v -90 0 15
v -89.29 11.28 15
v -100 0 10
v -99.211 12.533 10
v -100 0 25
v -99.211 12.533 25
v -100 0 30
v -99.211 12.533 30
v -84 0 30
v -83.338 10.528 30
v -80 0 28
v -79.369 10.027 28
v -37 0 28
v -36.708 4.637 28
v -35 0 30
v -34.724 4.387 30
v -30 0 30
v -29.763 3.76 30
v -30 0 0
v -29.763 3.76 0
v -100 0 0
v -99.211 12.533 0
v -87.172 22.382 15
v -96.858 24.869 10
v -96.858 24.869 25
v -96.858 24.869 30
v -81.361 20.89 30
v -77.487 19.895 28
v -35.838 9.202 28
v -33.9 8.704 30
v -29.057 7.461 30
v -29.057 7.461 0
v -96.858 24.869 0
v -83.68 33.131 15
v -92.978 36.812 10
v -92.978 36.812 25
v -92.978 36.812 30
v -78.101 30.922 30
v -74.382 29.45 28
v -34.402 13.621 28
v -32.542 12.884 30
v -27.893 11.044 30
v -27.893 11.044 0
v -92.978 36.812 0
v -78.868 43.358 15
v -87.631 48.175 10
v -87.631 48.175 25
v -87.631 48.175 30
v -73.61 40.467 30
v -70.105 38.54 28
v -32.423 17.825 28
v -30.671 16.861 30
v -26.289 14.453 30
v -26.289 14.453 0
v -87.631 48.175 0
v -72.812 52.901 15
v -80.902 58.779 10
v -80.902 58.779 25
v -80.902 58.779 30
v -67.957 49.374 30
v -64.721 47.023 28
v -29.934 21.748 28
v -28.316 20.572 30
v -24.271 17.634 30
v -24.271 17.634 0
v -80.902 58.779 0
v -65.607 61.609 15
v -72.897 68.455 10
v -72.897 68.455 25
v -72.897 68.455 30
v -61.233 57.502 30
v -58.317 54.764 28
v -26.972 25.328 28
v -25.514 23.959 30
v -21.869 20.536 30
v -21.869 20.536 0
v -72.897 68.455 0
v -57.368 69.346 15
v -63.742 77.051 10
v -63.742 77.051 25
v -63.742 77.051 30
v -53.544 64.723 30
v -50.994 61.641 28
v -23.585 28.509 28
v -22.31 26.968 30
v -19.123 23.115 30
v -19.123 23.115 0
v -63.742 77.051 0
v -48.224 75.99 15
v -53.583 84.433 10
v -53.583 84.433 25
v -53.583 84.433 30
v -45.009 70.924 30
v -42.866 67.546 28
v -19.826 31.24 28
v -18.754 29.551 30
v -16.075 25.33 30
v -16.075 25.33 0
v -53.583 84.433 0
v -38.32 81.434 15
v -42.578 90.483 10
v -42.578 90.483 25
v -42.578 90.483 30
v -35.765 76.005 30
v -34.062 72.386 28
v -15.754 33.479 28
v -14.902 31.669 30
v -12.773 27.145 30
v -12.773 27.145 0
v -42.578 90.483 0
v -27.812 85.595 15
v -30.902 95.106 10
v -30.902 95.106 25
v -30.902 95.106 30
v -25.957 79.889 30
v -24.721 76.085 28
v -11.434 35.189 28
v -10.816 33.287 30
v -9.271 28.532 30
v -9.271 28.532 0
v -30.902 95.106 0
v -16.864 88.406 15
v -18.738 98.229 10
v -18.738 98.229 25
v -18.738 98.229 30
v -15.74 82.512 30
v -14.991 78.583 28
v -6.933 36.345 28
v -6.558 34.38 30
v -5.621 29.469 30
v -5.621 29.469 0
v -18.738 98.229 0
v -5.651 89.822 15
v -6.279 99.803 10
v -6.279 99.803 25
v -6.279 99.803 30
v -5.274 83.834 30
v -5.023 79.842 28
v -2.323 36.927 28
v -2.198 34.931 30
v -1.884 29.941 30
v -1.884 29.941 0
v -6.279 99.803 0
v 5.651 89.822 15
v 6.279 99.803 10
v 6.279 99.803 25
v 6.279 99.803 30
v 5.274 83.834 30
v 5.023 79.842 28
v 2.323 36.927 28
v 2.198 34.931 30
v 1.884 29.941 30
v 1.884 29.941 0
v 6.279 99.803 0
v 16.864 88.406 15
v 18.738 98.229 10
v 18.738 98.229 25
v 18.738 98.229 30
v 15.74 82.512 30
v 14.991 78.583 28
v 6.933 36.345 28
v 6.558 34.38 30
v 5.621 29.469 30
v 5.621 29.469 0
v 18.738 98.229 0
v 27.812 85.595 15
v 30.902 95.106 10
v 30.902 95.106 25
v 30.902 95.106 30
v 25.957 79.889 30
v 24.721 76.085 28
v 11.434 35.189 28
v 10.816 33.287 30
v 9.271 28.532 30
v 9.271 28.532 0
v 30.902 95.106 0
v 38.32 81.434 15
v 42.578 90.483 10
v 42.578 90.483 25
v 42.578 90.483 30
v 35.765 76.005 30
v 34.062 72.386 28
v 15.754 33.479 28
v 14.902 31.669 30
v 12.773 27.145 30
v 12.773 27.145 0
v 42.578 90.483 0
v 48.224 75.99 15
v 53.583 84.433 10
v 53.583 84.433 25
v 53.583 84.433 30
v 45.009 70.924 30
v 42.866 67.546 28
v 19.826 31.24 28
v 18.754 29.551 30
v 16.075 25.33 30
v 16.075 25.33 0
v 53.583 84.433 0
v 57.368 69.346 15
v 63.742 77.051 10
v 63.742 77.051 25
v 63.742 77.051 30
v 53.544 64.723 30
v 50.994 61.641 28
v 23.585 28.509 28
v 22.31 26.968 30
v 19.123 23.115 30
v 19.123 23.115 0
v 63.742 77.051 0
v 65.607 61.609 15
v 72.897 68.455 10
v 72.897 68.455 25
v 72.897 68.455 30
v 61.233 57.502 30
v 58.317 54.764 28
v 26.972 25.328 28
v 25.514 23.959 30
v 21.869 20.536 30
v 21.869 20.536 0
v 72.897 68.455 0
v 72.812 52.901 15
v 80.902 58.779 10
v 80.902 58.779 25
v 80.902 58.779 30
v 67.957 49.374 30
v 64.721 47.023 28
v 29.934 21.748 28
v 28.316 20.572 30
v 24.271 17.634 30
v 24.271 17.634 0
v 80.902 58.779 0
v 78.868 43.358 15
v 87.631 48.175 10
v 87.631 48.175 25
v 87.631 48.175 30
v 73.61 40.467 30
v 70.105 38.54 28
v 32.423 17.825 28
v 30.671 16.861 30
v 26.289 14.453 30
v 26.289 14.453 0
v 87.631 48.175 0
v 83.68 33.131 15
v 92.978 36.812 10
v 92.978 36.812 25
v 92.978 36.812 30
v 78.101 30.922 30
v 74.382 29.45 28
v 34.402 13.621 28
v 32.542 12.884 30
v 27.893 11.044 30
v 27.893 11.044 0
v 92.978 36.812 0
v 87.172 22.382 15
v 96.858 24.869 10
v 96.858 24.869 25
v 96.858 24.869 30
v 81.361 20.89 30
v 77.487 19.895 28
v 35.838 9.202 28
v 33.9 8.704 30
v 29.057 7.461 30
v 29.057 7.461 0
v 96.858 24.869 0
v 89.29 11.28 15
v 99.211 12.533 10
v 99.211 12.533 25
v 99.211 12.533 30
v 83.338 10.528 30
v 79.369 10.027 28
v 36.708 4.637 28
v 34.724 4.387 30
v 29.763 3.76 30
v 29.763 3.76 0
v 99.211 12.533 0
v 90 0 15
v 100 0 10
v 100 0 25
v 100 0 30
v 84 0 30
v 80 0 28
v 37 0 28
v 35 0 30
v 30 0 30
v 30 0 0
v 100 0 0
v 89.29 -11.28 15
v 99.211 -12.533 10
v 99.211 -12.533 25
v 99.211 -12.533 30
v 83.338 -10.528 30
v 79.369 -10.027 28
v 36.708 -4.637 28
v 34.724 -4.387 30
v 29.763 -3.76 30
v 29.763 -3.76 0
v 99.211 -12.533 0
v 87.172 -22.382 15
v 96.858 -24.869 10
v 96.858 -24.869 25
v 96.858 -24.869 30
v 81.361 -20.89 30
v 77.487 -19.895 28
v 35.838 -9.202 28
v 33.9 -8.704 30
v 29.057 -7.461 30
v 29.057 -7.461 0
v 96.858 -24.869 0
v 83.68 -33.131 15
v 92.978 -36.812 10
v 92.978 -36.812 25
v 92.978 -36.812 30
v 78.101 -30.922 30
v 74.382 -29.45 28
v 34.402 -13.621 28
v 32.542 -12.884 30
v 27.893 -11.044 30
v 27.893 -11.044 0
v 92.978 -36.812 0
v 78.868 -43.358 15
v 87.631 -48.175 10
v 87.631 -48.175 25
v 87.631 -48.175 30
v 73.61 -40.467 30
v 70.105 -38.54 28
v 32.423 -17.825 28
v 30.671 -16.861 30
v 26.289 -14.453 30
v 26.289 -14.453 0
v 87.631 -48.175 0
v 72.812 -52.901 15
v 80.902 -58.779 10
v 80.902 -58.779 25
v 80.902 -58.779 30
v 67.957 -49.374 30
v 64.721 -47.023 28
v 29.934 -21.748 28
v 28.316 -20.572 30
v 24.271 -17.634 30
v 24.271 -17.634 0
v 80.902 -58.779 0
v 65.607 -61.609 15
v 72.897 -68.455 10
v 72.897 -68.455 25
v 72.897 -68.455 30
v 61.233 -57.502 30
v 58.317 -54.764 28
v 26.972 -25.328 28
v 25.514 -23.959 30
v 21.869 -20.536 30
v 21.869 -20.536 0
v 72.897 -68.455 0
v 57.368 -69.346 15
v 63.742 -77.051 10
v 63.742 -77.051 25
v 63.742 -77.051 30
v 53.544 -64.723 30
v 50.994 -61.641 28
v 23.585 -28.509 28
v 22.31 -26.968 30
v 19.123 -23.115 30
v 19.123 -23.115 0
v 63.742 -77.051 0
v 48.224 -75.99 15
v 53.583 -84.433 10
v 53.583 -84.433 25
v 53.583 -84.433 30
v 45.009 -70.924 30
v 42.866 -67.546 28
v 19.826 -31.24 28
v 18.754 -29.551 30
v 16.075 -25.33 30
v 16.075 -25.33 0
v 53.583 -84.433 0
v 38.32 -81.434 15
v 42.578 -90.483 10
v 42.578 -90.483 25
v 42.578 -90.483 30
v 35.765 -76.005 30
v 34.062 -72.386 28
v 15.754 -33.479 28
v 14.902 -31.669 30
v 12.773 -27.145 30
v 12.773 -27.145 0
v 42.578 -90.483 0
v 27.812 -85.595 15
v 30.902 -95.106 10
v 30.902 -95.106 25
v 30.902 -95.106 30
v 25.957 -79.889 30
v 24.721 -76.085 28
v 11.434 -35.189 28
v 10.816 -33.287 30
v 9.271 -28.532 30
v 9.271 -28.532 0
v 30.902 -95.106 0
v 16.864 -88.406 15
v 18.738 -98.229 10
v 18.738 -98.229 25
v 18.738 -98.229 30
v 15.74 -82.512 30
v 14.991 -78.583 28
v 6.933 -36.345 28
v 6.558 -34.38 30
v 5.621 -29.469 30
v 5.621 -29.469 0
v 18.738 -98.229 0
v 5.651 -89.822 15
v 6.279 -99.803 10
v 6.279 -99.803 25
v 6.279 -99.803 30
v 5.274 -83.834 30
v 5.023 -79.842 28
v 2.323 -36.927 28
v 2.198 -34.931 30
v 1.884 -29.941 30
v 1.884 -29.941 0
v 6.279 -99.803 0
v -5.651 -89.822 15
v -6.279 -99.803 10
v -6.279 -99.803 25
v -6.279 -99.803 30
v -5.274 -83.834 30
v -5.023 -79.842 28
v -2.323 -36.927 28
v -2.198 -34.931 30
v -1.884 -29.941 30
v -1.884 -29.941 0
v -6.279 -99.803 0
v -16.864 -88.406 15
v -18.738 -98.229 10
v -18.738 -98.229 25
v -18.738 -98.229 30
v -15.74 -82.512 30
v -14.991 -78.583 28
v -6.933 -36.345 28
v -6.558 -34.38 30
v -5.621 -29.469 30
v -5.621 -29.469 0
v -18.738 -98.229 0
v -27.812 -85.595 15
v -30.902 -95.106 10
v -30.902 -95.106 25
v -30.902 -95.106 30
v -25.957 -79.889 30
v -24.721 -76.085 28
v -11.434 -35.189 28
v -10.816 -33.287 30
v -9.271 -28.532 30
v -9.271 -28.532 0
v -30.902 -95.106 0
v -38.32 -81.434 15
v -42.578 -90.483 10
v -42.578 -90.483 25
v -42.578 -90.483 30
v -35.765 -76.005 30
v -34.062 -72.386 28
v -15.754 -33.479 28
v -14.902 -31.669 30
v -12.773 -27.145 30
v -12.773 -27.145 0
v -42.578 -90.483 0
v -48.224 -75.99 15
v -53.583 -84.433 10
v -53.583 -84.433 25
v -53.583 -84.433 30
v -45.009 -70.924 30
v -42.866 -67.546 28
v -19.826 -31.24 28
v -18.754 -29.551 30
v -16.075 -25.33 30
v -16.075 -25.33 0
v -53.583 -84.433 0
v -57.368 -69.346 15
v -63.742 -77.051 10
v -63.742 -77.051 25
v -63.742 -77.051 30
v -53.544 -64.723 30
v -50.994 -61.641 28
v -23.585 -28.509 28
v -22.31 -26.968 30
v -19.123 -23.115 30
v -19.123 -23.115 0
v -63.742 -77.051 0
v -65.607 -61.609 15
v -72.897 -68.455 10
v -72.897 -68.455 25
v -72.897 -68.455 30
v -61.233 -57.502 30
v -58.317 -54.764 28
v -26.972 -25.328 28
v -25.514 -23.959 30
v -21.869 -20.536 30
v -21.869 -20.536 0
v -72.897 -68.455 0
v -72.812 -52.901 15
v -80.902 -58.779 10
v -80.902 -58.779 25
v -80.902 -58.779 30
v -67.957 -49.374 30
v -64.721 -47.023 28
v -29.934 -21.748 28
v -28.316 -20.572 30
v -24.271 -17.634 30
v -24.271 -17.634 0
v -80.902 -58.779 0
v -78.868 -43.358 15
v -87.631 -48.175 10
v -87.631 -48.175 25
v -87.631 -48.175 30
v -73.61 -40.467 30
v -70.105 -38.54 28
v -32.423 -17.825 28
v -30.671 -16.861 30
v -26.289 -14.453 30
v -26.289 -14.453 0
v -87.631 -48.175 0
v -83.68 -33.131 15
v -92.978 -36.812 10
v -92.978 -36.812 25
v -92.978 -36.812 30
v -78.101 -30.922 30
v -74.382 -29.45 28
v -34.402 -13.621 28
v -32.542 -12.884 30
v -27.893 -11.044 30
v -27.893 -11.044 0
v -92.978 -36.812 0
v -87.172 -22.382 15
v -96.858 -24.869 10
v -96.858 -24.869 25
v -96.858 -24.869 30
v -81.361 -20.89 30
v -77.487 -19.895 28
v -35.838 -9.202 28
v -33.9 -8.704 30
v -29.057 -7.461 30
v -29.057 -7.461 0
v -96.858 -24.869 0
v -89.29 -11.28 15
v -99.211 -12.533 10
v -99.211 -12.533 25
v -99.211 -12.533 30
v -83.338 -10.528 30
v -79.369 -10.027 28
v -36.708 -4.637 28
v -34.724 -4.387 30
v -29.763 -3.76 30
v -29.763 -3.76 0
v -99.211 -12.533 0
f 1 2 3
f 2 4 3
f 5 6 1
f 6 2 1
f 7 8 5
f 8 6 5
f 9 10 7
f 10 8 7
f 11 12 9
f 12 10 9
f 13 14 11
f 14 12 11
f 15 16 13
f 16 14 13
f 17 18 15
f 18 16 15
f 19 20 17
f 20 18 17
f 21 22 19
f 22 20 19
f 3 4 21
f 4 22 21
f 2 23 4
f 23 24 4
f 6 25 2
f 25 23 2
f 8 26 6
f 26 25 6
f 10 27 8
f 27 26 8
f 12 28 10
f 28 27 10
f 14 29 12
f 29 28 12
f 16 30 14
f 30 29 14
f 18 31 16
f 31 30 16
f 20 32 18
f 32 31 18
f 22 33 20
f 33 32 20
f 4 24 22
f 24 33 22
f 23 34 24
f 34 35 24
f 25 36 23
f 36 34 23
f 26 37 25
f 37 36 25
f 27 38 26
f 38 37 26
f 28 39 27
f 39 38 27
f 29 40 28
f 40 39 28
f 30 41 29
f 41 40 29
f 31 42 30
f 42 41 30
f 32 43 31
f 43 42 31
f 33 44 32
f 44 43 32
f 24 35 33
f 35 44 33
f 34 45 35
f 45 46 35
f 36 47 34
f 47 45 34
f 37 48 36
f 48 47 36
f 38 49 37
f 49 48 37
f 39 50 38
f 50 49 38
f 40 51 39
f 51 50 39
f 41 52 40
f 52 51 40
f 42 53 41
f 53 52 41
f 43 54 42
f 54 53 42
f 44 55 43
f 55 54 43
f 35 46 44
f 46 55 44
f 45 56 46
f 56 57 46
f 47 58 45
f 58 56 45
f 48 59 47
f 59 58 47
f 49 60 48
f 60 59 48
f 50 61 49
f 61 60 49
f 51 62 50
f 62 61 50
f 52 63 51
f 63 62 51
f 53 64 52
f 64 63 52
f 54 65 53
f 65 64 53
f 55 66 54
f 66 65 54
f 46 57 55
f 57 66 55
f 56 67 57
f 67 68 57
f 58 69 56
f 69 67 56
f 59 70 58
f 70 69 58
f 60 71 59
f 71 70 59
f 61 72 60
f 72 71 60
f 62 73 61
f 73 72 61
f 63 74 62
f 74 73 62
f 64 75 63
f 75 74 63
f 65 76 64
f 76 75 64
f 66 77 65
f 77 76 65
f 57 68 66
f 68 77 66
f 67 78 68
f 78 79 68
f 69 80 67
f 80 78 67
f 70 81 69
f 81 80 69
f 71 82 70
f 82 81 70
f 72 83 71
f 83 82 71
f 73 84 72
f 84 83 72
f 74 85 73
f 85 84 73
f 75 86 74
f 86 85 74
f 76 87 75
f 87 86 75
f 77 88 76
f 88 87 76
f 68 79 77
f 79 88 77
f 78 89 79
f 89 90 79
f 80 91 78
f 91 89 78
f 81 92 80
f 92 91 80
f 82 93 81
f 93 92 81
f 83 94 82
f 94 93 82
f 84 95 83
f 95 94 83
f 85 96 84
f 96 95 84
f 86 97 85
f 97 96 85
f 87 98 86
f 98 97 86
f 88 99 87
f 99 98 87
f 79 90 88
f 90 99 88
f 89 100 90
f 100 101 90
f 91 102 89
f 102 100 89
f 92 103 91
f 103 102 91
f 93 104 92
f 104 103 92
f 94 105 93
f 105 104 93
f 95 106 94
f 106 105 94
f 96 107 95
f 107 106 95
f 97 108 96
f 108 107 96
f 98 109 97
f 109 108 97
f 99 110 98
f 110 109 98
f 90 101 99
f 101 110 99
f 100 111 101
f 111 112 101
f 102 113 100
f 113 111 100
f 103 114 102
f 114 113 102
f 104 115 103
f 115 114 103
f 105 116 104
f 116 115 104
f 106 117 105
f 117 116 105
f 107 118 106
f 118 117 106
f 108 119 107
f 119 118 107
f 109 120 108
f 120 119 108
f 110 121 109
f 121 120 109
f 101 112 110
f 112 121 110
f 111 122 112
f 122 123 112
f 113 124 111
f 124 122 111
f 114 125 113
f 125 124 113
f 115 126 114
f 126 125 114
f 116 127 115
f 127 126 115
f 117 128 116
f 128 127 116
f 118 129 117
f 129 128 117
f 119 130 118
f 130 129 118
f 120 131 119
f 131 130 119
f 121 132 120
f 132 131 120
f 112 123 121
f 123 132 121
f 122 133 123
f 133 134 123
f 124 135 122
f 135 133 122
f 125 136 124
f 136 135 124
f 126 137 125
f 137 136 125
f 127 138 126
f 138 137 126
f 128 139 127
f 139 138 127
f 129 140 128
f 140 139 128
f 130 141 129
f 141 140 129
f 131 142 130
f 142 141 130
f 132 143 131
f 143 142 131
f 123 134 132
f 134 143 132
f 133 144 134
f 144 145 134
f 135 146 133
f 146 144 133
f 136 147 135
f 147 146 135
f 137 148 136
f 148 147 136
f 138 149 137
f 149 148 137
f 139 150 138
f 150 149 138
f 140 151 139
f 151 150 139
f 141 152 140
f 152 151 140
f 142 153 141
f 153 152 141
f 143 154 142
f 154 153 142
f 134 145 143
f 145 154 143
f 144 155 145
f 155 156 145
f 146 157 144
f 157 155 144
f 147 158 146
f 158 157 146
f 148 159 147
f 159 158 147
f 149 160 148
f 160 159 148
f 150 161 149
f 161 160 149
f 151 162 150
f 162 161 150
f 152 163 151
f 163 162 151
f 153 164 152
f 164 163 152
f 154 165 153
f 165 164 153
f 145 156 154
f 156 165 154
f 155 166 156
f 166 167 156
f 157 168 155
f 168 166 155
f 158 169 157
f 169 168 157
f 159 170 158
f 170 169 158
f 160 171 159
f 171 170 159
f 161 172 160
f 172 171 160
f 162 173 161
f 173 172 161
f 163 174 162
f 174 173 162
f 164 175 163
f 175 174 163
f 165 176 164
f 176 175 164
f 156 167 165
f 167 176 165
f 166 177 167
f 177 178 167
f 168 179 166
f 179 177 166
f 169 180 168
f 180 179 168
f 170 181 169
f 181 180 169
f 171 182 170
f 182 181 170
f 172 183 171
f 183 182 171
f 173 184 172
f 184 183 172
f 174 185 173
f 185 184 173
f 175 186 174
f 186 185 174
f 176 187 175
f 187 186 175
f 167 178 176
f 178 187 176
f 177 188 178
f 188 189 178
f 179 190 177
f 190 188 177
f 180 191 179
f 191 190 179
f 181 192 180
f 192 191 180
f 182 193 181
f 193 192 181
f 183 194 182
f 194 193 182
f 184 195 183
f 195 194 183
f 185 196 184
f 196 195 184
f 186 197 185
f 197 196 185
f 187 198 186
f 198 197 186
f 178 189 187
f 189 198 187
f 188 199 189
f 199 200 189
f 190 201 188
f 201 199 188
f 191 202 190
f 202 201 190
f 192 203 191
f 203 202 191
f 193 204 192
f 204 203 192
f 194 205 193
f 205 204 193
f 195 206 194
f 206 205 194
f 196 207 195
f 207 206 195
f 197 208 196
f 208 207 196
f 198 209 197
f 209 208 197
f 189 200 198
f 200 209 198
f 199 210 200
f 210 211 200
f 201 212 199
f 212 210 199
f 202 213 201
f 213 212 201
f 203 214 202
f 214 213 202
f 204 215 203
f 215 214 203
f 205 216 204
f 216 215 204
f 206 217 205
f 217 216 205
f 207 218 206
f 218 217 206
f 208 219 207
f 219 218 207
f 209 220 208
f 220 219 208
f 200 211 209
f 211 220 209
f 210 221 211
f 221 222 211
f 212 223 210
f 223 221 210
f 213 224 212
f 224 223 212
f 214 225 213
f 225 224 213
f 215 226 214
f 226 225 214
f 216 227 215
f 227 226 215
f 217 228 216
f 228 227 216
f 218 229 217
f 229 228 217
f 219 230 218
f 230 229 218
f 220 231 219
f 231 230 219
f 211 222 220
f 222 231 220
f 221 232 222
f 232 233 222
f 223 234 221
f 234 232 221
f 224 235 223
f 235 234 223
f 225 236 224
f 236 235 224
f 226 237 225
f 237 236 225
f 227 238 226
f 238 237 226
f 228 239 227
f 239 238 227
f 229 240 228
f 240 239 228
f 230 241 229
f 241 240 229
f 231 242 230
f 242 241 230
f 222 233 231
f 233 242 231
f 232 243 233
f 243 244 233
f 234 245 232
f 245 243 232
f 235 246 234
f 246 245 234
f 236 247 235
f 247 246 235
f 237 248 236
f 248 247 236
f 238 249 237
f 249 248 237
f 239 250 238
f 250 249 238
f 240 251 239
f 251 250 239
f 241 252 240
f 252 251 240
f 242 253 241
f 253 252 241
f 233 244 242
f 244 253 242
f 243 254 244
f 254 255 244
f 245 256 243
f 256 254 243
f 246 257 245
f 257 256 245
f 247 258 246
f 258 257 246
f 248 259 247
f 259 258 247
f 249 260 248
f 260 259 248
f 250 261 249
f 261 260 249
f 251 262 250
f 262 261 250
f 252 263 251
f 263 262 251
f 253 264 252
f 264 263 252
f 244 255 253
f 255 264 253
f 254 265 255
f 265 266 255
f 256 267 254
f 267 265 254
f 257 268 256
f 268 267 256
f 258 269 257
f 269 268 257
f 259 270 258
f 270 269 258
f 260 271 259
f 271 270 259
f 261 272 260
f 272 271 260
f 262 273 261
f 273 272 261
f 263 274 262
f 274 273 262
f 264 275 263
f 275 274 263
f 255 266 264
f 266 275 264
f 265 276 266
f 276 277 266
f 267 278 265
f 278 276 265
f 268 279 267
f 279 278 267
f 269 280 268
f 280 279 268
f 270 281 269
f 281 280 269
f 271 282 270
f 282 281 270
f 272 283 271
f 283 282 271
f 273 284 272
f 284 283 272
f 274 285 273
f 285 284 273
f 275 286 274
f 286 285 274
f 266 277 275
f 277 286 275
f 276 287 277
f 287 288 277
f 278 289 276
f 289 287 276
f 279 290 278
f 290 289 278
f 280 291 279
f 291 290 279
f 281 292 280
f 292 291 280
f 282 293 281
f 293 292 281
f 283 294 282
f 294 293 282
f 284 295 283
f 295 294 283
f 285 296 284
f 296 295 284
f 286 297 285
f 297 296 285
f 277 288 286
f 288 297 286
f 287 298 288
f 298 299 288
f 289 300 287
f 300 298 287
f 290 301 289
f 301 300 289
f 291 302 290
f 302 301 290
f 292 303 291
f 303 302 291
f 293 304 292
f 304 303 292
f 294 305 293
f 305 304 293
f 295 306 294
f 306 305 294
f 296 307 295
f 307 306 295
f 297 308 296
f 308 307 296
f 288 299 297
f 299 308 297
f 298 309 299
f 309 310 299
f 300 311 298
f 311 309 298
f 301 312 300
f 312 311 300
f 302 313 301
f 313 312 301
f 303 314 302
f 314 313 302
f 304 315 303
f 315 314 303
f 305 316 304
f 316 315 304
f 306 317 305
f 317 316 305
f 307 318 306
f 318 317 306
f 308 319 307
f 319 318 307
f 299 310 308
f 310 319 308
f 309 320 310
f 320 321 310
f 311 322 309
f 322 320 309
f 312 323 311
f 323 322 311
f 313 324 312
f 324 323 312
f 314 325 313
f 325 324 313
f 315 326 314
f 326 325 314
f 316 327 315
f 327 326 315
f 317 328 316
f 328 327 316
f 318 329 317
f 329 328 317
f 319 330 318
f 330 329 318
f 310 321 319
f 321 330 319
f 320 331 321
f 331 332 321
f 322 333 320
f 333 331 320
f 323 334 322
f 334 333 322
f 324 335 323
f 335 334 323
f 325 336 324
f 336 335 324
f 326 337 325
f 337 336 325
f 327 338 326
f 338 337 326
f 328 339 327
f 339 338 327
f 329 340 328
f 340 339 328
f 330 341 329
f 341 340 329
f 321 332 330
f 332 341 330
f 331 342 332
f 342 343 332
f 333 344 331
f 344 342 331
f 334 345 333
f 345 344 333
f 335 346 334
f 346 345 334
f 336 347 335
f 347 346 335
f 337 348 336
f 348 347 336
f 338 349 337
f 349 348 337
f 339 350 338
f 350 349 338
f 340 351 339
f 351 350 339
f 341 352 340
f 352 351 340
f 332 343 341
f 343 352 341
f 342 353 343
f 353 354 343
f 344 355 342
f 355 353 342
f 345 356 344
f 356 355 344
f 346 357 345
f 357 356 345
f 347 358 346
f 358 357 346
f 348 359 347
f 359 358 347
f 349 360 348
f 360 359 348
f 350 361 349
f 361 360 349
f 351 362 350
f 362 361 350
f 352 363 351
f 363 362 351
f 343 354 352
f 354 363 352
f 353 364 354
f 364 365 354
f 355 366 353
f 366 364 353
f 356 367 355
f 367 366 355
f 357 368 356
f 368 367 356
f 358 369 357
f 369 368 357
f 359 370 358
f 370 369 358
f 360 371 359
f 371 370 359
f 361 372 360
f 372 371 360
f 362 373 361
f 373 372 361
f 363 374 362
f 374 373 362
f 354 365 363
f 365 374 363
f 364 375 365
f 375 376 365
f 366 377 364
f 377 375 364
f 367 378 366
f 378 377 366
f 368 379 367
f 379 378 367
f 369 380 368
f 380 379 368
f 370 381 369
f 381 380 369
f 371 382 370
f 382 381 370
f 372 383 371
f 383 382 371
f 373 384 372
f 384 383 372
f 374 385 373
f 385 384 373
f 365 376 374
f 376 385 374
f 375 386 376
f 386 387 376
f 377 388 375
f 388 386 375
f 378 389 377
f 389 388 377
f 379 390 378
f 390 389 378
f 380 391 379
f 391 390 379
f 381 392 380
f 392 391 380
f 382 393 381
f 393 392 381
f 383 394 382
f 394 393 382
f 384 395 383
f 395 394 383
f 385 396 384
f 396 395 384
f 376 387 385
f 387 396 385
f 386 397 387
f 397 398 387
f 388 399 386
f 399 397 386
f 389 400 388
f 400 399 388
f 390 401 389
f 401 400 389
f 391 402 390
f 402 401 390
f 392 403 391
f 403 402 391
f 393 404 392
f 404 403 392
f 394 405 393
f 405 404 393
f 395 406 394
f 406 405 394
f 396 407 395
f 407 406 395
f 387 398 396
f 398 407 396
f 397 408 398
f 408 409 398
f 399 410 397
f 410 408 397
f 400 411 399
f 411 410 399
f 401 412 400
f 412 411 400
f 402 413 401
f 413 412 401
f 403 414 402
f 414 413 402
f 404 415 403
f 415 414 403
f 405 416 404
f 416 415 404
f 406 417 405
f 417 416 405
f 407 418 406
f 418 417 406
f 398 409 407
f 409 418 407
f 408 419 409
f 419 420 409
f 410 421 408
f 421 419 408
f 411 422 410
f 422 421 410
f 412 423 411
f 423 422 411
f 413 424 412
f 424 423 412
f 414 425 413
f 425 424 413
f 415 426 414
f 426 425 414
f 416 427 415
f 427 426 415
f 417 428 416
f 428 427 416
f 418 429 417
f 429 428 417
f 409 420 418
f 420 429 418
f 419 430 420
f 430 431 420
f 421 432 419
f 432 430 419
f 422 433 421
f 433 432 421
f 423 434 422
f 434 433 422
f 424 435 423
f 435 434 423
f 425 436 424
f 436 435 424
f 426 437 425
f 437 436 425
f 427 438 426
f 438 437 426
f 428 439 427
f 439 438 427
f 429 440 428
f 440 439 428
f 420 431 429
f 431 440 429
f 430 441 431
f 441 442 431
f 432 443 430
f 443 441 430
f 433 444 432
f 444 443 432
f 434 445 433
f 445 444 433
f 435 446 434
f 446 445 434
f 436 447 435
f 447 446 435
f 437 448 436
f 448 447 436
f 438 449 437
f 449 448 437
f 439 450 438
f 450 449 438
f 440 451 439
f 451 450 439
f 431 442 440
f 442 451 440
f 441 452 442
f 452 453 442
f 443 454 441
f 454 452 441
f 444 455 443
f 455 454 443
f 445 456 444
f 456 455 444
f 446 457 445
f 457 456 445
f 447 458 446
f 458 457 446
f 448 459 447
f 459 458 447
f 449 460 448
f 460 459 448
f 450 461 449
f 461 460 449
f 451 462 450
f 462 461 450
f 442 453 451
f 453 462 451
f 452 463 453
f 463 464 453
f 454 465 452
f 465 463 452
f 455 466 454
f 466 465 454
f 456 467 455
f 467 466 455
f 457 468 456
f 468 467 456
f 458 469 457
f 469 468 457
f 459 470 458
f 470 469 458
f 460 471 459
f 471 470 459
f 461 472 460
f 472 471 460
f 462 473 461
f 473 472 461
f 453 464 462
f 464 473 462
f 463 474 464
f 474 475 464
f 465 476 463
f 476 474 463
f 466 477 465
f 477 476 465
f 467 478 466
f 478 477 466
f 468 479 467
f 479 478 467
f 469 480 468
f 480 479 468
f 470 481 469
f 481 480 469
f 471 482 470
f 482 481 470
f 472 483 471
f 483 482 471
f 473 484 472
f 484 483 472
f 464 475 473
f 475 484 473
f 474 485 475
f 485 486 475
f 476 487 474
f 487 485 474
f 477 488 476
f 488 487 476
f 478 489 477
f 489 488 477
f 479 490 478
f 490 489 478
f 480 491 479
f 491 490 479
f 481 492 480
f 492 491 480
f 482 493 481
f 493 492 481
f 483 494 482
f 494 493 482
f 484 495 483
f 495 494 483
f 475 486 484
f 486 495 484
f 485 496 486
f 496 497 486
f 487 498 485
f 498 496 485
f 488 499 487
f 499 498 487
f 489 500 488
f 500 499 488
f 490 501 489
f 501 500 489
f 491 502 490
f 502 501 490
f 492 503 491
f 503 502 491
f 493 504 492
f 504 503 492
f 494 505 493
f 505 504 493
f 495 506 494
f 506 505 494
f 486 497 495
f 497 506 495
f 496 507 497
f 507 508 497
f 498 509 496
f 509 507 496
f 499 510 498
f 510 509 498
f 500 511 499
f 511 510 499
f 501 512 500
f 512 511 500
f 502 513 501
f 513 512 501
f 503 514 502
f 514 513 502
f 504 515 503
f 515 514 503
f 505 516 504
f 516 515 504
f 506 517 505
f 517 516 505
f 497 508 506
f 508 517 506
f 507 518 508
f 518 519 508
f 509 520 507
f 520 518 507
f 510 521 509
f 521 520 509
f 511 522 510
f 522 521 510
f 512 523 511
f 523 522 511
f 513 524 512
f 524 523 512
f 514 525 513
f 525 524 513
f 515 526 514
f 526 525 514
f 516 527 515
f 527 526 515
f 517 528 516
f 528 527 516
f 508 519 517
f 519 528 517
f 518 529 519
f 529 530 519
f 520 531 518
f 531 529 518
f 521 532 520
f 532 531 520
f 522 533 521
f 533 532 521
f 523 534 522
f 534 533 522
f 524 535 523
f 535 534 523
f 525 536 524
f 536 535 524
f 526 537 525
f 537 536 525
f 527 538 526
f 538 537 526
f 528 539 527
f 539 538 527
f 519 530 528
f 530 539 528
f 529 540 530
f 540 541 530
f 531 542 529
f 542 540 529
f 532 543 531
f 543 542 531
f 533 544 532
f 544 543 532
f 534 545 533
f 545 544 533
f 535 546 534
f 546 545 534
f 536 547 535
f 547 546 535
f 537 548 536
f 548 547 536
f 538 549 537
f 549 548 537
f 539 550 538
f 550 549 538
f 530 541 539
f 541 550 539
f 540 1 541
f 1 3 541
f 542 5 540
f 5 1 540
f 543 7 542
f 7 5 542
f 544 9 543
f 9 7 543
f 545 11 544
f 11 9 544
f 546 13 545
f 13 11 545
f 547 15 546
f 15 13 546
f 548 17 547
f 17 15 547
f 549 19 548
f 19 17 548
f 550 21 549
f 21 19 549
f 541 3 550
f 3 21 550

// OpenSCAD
/*
rotate_extrude

Rotational extrusion spins a 2D shape around the Z-axis to form a solid which has rotational symmetry. One way to think of this operation is to imagine a Potter's wheel placed on the X-Y plane with its axis of rotation pointing up towards +Z. Then place the to-be-made object on this virtual Potter's wheel (possibly extending down below the X-Y plane towards -Z). The to-be-made object is the cross-section of the object on the X-Y plane (keeping only the right half, X >= 0). That is the 2D shape that will be fed to rotate_extrude() as the child in order to generate this solid. Note that the object started on the X-Y plane but is tilted up (rotated +90 degrees about the X-axis) to extrude.

Since a 2D shape is rendered by OpenSCAD on the X-Y plane, an alternative way to think of this operation is as follows: spins a 2D shape around the Y-axis to form a solid. The resultant solid is placed so that its axis of rotation lies along the Z-axis.

Just like the linear_extrude, the extrusion is always performed on the projection of the 2D polygon to the XY plane. Transformations like rotate, translate, etc. applied to the 2D polygon before extrusion modify the projection of the 2D polygon to the XY plane and therefore also modify the appearance of the final 3D object.

    A translation in Z of the 2D polygon has no effect on the result (as also the projection is not affected).
    A translation in X increases the diameter of the final object.
    A translation in Y results in a shift of the final object in Z direction.
    A rotation about the X or Y axis distorts the cross section of the final object, as also the projection to the XY plane is distorted.

Don't get confused, as OpenSCAD displays 2D polygons with a certain height in the Z direction, so the 2D object (with its height) appears to have a bigger projection to the XY plane. But for the projection to the XY plane and also for the later extrusion only the base polygon without height is used.

You cannot use rotate_extrude to produce a helix or screw thread. Doing this properly can be difficult, so it's best to find a thread library to make them for you.

The 2D shape must lie completely on either the right (recommended) or the left side of the Y-axis. More precisely speaking, every vertex of the shape must have either x >= 0 or x <= 0. If the shape spans the X axis a warning appears in the console windows and the rotate_extrude() is ignored. If the 2D shape touches the Y axis, i.e. at x=0, it must be a line that touches, not a point, as a point results in a zero thickness 3D object, which is invalid and results in a CGAL error. For OpenSCAD versions prior to 2016.xxxx, if the shape is in the negative axis the resulting faces are oriented inside-out, which may cause undesired effects.
Usage

rotate_extrude(angle = 360, start=0, convexity = 2) {...}

Right-hand grip rule

In 2021.01 and previous, you must use parameter names due to a backward compatibility issue.

    convexity : If the extrusion fails for a non-trival 2D shape, try setting the convexity parameter (the default is not 10, but 10 is a "good" value to try).  The convexity parameter specifies the maximum number of front sides (or back sides) a ray intersecting the object might penetrate. This parameter is only needed for correctly displaying the object in OpenCSG preview mode when using the standard Goldfeather algorithm and has no effect on the polyhedron rendering (the mesh generation).


The convexity of a primitive is the maximum number of front (or back) faces of the primitive at a single position. For example, the convexity of a sphere is one and the convexity of a torus is two. 
    
    angle [Note: Requires version 2019.05] : Defaults to 360. Specifies the number of degrees to sweep, starting at the positive X axis. The direction of the sweep follows the Right Hand Rule, hence a negative angle sweeps clockwise.
    start [Note: Requires version Development snapshot] : Defaults to 0 if angle is specified, and 180 if not. Specifies the starting angle of the extrusion, counter-clockwise from the positive X axis.
    $fa : minimum angle (in degrees) of each fragment.
    $fs : minimum circumferential length of each fragment.
    $fn : fixed number of fragments in 360 degrees. Values of 3 or more override $fa and $fs

        $fa, $fs and $fn must be named parameters. click here for more details,.
        
        

*/
// Polygon - based extrusion
$fa = 1;
$fs = 0.4;
$fn = 50;

// \var height 1 y distance
h1 = 23;
// \var height 2 y distance
h2 = 10;
// \var height 3 y distance
h3 = 8;
// \var distances from origin
// first segment start x distance
d1 = 25; 
// second segment x distance
d2 = 12;
// final segment x distance 
d3 = 15;

/*

Rim outline nomenclature:       x4,y4
axis          x1,y0            p5     p6 x6,y6
  y           p2   EXTENT       *-----* 
y0|HUB  p1 *----*              /      |    
y1|  x0,y0 |     \       x3,y2/       * p7 x6,y7
y2|        |      *----------*       /
  |INNER   |     p3         p4      /     OUTER
  |        |    x2,y1         x5,y8* p8    BARREL
  |        |                       | x5,y8
  |        |                       |
  |        |                       * p9 x5,y9
  |        |                        \
  | START  |                         * p10 x6,y10
  |        |                         |
  |x0,0 p0 *-----------------*--*--*-* p11 END
  |        x0 x1 x2 BASE    x3 x4 x5 x6 
  |----------  x  axis -------------------
vec2 point p array:
[(x0,y0),(x1,y1),(x2,y2),(x3,y3),(x4,y4),(x5,y5),(x6,y6),(x7,y7),(x8,y8),(x9,y9),(x10,y10,(x11,y11)] 
two profile (extent barrel - outer barrel ) version
//p0 p1    p2    p3    p4    p5    p6    p7    p8    p9     p10    p11 
x0,0 x0,y0 x1,y1 x2,y2 x3,y2 x4,y0 x6,y0 x6,y7 x5,y8 x6,y9 x6,y10 x6,0 
*/

// vec2 array:
// X of [p(x,y)] are heights along x axis from origin
// Y of [p(x,y)] are the distances above x axis (which may by offset)
inner_hub_height = 30;
inner_extent_lip = inner_hub_height - 2;

outer_hub_height = inner_hub_height;
x0 = 0;
x1 = 5;
x2 = 7;
x3 = 50;
x4 = 54;
x5 = 60;
x6 = 70;
y0 = inner_hub_height;
y1 = inner_hub_height;
y2 = inner_extent_lip;
y3 = inner_extent_lip;
y4 = inner_hub_height;
y5 = inner_hub_height;
y6 = outer_hub_height;
y7 = outer_hub_height-5;
y8 = outer_hub_height-15;
y9 = outer_hub_height-15;
y10 = 0 + 10;
y11 = 0;
// This is where altering parameter points can lead to various profiles
// two profile (extent barrel - outer barrel ) version
// p0   p1    p2    p3    p4    p5    p6    p7    p8    p9    p10    p11 
// x0,0 x0,y0 x1,y1 x2,y2 x3,y2 x4,y0 x6,y0 x6,y0 x6,y7 x5,y9 x6,y10 x6,0
// INNER HUB BASE ORIGIN
// HUB BASE - AT ZERO
p0  = [x0, 0]; // correct
// INNER HUB EXTENT
p1  = [x0, y0]; // correct
// INNER HUB LIP
p2  = [x1, y1];
// EXTENT HUB BARREL
p3  = [x2, y2];
p4  = [x3, y2];
p5  = [x4, y0];
p6  = [x6, y0];
p7  = [x6, y7];
p8  = [x5, y8];
p9  = [x5, y9];
p10 = [x6, y10];
p11 = [x6, 0];



// The rotated polygon profile
// convert vec2 into an array of vec2
points = [p0, p1, p2, p3, p4, p5, p6, p7, p8, p9, p10, p11];

// DEBUG 
echo("polygon points : ", p0, p1, p2, p3, p4, p5, p6, p7, p8, p9, p10, p11 );
// demo the 2D object here
color("cyan")translate([0, 150, 0])rotate([ 90, 0, 90])polygon(points);
// DEBUG
// extend from x-y axis origin by x, y, z
hub_radius = 30;
rotate_extrude(angle=360)translate([hub_radius,0,0])
    polygon(points);
